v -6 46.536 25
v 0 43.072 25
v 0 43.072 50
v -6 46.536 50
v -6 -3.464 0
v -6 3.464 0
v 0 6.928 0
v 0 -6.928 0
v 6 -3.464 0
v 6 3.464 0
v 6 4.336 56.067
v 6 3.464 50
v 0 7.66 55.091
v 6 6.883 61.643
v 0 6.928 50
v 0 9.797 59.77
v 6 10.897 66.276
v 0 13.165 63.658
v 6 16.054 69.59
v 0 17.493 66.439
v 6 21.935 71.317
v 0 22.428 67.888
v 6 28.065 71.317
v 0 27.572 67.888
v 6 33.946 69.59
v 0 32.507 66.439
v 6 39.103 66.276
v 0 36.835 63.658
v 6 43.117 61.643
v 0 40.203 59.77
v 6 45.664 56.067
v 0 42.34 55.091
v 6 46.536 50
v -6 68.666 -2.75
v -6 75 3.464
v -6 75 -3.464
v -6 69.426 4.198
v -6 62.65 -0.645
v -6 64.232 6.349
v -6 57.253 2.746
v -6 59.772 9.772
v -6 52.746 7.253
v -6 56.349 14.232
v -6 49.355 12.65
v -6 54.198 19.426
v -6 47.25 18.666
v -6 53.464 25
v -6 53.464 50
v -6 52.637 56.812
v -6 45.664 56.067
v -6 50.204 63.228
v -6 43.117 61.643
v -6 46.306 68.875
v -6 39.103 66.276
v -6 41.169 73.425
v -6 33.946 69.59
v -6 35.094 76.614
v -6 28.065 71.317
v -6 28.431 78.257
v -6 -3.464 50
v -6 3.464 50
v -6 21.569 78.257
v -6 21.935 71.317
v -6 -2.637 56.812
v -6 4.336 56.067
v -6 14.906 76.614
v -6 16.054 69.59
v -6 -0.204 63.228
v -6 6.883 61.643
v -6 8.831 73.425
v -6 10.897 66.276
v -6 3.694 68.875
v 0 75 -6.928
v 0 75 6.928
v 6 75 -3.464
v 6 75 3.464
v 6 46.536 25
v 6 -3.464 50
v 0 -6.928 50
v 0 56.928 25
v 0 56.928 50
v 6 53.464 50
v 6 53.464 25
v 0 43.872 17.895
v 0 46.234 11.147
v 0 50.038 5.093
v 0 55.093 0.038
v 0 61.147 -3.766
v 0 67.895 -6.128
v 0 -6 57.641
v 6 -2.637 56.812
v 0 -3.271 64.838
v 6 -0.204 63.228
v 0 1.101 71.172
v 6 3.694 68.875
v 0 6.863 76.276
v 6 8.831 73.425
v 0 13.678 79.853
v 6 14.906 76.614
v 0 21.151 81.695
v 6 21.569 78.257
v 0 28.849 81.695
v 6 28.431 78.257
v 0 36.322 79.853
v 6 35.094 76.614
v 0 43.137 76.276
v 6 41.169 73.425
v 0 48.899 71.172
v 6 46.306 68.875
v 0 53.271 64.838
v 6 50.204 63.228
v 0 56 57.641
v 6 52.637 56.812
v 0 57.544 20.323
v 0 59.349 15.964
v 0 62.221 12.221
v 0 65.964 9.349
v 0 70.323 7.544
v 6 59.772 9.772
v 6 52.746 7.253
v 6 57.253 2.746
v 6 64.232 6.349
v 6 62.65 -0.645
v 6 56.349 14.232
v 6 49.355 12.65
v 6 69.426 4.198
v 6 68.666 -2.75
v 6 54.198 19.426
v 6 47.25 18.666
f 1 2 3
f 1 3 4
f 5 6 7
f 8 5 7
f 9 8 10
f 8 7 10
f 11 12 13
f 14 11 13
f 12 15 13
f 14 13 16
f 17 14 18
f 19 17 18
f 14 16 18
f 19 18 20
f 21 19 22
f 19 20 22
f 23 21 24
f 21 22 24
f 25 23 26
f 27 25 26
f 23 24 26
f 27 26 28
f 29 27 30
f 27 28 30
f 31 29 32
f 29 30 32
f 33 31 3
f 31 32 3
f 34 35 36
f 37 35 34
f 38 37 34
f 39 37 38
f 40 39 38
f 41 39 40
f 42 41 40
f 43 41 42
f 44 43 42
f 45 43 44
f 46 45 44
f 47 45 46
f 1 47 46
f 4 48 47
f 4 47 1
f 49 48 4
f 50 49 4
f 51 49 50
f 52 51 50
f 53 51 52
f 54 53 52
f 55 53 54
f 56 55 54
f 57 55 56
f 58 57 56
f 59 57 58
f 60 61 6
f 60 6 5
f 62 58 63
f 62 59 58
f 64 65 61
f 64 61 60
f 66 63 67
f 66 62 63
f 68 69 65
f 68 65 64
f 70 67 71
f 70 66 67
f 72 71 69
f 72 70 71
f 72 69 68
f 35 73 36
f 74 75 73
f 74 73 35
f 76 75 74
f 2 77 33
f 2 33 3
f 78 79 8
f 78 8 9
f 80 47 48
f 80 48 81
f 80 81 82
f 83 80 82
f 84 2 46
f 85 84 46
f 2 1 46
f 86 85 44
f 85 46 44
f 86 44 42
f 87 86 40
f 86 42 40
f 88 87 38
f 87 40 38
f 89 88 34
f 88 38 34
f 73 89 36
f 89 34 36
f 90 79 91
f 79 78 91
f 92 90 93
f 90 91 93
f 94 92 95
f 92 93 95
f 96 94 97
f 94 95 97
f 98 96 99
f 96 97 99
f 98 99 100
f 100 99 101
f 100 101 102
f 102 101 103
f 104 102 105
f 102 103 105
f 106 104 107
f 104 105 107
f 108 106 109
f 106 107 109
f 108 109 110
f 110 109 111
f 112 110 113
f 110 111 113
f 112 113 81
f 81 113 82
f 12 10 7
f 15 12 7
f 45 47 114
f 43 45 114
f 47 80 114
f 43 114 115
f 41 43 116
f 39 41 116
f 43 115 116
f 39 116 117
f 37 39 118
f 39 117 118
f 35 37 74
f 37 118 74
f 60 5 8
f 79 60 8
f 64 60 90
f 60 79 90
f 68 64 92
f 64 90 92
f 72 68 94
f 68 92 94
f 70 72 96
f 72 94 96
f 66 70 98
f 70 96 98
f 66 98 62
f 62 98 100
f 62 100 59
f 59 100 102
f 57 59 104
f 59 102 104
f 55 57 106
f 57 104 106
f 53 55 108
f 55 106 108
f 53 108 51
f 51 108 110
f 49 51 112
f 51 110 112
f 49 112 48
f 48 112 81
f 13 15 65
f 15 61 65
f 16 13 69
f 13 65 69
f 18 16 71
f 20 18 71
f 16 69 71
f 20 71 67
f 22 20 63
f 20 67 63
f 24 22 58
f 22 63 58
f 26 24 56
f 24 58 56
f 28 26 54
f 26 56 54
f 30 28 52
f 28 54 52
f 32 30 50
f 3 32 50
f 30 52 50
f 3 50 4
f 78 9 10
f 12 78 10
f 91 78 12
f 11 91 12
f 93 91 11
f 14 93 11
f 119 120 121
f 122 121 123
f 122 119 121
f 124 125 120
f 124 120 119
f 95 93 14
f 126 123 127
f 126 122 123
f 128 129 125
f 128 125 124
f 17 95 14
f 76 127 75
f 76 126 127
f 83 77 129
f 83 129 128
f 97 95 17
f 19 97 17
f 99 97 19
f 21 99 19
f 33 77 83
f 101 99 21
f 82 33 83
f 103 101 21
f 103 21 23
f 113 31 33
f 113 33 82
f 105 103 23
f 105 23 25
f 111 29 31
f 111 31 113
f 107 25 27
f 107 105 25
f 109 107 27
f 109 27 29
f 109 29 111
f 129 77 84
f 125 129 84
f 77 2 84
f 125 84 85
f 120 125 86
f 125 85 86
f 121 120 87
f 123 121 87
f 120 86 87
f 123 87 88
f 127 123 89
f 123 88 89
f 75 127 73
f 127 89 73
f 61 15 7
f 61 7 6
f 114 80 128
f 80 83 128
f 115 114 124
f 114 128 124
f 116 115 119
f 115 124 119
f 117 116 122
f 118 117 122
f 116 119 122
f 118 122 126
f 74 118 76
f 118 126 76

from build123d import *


with BuildPart() as f2:
    # F2: sweep along a path in F0
    with BuildLine(Plane.YZ) as f2_path:
        Line((0, 0), (0, 50))
        ThreePointArc((0, 50), (25, 75), (50, 50))
        Line((50, 50), (50, 25))
        ThreePointArc((50, 25), (57.32233, 7.32233), (75, 0))
    # F1 (on Top) → F2 (sweep)
    with BuildSketch(Plane.XY):
        Polygon((6, -3.464102), (6, 3.464102), (0, 6.928203), (-6, 3.464102), (-6, -3.464102), (0, -6.928203), align=None)
    sweep(path=f2_path.line)


solid = f2.part
